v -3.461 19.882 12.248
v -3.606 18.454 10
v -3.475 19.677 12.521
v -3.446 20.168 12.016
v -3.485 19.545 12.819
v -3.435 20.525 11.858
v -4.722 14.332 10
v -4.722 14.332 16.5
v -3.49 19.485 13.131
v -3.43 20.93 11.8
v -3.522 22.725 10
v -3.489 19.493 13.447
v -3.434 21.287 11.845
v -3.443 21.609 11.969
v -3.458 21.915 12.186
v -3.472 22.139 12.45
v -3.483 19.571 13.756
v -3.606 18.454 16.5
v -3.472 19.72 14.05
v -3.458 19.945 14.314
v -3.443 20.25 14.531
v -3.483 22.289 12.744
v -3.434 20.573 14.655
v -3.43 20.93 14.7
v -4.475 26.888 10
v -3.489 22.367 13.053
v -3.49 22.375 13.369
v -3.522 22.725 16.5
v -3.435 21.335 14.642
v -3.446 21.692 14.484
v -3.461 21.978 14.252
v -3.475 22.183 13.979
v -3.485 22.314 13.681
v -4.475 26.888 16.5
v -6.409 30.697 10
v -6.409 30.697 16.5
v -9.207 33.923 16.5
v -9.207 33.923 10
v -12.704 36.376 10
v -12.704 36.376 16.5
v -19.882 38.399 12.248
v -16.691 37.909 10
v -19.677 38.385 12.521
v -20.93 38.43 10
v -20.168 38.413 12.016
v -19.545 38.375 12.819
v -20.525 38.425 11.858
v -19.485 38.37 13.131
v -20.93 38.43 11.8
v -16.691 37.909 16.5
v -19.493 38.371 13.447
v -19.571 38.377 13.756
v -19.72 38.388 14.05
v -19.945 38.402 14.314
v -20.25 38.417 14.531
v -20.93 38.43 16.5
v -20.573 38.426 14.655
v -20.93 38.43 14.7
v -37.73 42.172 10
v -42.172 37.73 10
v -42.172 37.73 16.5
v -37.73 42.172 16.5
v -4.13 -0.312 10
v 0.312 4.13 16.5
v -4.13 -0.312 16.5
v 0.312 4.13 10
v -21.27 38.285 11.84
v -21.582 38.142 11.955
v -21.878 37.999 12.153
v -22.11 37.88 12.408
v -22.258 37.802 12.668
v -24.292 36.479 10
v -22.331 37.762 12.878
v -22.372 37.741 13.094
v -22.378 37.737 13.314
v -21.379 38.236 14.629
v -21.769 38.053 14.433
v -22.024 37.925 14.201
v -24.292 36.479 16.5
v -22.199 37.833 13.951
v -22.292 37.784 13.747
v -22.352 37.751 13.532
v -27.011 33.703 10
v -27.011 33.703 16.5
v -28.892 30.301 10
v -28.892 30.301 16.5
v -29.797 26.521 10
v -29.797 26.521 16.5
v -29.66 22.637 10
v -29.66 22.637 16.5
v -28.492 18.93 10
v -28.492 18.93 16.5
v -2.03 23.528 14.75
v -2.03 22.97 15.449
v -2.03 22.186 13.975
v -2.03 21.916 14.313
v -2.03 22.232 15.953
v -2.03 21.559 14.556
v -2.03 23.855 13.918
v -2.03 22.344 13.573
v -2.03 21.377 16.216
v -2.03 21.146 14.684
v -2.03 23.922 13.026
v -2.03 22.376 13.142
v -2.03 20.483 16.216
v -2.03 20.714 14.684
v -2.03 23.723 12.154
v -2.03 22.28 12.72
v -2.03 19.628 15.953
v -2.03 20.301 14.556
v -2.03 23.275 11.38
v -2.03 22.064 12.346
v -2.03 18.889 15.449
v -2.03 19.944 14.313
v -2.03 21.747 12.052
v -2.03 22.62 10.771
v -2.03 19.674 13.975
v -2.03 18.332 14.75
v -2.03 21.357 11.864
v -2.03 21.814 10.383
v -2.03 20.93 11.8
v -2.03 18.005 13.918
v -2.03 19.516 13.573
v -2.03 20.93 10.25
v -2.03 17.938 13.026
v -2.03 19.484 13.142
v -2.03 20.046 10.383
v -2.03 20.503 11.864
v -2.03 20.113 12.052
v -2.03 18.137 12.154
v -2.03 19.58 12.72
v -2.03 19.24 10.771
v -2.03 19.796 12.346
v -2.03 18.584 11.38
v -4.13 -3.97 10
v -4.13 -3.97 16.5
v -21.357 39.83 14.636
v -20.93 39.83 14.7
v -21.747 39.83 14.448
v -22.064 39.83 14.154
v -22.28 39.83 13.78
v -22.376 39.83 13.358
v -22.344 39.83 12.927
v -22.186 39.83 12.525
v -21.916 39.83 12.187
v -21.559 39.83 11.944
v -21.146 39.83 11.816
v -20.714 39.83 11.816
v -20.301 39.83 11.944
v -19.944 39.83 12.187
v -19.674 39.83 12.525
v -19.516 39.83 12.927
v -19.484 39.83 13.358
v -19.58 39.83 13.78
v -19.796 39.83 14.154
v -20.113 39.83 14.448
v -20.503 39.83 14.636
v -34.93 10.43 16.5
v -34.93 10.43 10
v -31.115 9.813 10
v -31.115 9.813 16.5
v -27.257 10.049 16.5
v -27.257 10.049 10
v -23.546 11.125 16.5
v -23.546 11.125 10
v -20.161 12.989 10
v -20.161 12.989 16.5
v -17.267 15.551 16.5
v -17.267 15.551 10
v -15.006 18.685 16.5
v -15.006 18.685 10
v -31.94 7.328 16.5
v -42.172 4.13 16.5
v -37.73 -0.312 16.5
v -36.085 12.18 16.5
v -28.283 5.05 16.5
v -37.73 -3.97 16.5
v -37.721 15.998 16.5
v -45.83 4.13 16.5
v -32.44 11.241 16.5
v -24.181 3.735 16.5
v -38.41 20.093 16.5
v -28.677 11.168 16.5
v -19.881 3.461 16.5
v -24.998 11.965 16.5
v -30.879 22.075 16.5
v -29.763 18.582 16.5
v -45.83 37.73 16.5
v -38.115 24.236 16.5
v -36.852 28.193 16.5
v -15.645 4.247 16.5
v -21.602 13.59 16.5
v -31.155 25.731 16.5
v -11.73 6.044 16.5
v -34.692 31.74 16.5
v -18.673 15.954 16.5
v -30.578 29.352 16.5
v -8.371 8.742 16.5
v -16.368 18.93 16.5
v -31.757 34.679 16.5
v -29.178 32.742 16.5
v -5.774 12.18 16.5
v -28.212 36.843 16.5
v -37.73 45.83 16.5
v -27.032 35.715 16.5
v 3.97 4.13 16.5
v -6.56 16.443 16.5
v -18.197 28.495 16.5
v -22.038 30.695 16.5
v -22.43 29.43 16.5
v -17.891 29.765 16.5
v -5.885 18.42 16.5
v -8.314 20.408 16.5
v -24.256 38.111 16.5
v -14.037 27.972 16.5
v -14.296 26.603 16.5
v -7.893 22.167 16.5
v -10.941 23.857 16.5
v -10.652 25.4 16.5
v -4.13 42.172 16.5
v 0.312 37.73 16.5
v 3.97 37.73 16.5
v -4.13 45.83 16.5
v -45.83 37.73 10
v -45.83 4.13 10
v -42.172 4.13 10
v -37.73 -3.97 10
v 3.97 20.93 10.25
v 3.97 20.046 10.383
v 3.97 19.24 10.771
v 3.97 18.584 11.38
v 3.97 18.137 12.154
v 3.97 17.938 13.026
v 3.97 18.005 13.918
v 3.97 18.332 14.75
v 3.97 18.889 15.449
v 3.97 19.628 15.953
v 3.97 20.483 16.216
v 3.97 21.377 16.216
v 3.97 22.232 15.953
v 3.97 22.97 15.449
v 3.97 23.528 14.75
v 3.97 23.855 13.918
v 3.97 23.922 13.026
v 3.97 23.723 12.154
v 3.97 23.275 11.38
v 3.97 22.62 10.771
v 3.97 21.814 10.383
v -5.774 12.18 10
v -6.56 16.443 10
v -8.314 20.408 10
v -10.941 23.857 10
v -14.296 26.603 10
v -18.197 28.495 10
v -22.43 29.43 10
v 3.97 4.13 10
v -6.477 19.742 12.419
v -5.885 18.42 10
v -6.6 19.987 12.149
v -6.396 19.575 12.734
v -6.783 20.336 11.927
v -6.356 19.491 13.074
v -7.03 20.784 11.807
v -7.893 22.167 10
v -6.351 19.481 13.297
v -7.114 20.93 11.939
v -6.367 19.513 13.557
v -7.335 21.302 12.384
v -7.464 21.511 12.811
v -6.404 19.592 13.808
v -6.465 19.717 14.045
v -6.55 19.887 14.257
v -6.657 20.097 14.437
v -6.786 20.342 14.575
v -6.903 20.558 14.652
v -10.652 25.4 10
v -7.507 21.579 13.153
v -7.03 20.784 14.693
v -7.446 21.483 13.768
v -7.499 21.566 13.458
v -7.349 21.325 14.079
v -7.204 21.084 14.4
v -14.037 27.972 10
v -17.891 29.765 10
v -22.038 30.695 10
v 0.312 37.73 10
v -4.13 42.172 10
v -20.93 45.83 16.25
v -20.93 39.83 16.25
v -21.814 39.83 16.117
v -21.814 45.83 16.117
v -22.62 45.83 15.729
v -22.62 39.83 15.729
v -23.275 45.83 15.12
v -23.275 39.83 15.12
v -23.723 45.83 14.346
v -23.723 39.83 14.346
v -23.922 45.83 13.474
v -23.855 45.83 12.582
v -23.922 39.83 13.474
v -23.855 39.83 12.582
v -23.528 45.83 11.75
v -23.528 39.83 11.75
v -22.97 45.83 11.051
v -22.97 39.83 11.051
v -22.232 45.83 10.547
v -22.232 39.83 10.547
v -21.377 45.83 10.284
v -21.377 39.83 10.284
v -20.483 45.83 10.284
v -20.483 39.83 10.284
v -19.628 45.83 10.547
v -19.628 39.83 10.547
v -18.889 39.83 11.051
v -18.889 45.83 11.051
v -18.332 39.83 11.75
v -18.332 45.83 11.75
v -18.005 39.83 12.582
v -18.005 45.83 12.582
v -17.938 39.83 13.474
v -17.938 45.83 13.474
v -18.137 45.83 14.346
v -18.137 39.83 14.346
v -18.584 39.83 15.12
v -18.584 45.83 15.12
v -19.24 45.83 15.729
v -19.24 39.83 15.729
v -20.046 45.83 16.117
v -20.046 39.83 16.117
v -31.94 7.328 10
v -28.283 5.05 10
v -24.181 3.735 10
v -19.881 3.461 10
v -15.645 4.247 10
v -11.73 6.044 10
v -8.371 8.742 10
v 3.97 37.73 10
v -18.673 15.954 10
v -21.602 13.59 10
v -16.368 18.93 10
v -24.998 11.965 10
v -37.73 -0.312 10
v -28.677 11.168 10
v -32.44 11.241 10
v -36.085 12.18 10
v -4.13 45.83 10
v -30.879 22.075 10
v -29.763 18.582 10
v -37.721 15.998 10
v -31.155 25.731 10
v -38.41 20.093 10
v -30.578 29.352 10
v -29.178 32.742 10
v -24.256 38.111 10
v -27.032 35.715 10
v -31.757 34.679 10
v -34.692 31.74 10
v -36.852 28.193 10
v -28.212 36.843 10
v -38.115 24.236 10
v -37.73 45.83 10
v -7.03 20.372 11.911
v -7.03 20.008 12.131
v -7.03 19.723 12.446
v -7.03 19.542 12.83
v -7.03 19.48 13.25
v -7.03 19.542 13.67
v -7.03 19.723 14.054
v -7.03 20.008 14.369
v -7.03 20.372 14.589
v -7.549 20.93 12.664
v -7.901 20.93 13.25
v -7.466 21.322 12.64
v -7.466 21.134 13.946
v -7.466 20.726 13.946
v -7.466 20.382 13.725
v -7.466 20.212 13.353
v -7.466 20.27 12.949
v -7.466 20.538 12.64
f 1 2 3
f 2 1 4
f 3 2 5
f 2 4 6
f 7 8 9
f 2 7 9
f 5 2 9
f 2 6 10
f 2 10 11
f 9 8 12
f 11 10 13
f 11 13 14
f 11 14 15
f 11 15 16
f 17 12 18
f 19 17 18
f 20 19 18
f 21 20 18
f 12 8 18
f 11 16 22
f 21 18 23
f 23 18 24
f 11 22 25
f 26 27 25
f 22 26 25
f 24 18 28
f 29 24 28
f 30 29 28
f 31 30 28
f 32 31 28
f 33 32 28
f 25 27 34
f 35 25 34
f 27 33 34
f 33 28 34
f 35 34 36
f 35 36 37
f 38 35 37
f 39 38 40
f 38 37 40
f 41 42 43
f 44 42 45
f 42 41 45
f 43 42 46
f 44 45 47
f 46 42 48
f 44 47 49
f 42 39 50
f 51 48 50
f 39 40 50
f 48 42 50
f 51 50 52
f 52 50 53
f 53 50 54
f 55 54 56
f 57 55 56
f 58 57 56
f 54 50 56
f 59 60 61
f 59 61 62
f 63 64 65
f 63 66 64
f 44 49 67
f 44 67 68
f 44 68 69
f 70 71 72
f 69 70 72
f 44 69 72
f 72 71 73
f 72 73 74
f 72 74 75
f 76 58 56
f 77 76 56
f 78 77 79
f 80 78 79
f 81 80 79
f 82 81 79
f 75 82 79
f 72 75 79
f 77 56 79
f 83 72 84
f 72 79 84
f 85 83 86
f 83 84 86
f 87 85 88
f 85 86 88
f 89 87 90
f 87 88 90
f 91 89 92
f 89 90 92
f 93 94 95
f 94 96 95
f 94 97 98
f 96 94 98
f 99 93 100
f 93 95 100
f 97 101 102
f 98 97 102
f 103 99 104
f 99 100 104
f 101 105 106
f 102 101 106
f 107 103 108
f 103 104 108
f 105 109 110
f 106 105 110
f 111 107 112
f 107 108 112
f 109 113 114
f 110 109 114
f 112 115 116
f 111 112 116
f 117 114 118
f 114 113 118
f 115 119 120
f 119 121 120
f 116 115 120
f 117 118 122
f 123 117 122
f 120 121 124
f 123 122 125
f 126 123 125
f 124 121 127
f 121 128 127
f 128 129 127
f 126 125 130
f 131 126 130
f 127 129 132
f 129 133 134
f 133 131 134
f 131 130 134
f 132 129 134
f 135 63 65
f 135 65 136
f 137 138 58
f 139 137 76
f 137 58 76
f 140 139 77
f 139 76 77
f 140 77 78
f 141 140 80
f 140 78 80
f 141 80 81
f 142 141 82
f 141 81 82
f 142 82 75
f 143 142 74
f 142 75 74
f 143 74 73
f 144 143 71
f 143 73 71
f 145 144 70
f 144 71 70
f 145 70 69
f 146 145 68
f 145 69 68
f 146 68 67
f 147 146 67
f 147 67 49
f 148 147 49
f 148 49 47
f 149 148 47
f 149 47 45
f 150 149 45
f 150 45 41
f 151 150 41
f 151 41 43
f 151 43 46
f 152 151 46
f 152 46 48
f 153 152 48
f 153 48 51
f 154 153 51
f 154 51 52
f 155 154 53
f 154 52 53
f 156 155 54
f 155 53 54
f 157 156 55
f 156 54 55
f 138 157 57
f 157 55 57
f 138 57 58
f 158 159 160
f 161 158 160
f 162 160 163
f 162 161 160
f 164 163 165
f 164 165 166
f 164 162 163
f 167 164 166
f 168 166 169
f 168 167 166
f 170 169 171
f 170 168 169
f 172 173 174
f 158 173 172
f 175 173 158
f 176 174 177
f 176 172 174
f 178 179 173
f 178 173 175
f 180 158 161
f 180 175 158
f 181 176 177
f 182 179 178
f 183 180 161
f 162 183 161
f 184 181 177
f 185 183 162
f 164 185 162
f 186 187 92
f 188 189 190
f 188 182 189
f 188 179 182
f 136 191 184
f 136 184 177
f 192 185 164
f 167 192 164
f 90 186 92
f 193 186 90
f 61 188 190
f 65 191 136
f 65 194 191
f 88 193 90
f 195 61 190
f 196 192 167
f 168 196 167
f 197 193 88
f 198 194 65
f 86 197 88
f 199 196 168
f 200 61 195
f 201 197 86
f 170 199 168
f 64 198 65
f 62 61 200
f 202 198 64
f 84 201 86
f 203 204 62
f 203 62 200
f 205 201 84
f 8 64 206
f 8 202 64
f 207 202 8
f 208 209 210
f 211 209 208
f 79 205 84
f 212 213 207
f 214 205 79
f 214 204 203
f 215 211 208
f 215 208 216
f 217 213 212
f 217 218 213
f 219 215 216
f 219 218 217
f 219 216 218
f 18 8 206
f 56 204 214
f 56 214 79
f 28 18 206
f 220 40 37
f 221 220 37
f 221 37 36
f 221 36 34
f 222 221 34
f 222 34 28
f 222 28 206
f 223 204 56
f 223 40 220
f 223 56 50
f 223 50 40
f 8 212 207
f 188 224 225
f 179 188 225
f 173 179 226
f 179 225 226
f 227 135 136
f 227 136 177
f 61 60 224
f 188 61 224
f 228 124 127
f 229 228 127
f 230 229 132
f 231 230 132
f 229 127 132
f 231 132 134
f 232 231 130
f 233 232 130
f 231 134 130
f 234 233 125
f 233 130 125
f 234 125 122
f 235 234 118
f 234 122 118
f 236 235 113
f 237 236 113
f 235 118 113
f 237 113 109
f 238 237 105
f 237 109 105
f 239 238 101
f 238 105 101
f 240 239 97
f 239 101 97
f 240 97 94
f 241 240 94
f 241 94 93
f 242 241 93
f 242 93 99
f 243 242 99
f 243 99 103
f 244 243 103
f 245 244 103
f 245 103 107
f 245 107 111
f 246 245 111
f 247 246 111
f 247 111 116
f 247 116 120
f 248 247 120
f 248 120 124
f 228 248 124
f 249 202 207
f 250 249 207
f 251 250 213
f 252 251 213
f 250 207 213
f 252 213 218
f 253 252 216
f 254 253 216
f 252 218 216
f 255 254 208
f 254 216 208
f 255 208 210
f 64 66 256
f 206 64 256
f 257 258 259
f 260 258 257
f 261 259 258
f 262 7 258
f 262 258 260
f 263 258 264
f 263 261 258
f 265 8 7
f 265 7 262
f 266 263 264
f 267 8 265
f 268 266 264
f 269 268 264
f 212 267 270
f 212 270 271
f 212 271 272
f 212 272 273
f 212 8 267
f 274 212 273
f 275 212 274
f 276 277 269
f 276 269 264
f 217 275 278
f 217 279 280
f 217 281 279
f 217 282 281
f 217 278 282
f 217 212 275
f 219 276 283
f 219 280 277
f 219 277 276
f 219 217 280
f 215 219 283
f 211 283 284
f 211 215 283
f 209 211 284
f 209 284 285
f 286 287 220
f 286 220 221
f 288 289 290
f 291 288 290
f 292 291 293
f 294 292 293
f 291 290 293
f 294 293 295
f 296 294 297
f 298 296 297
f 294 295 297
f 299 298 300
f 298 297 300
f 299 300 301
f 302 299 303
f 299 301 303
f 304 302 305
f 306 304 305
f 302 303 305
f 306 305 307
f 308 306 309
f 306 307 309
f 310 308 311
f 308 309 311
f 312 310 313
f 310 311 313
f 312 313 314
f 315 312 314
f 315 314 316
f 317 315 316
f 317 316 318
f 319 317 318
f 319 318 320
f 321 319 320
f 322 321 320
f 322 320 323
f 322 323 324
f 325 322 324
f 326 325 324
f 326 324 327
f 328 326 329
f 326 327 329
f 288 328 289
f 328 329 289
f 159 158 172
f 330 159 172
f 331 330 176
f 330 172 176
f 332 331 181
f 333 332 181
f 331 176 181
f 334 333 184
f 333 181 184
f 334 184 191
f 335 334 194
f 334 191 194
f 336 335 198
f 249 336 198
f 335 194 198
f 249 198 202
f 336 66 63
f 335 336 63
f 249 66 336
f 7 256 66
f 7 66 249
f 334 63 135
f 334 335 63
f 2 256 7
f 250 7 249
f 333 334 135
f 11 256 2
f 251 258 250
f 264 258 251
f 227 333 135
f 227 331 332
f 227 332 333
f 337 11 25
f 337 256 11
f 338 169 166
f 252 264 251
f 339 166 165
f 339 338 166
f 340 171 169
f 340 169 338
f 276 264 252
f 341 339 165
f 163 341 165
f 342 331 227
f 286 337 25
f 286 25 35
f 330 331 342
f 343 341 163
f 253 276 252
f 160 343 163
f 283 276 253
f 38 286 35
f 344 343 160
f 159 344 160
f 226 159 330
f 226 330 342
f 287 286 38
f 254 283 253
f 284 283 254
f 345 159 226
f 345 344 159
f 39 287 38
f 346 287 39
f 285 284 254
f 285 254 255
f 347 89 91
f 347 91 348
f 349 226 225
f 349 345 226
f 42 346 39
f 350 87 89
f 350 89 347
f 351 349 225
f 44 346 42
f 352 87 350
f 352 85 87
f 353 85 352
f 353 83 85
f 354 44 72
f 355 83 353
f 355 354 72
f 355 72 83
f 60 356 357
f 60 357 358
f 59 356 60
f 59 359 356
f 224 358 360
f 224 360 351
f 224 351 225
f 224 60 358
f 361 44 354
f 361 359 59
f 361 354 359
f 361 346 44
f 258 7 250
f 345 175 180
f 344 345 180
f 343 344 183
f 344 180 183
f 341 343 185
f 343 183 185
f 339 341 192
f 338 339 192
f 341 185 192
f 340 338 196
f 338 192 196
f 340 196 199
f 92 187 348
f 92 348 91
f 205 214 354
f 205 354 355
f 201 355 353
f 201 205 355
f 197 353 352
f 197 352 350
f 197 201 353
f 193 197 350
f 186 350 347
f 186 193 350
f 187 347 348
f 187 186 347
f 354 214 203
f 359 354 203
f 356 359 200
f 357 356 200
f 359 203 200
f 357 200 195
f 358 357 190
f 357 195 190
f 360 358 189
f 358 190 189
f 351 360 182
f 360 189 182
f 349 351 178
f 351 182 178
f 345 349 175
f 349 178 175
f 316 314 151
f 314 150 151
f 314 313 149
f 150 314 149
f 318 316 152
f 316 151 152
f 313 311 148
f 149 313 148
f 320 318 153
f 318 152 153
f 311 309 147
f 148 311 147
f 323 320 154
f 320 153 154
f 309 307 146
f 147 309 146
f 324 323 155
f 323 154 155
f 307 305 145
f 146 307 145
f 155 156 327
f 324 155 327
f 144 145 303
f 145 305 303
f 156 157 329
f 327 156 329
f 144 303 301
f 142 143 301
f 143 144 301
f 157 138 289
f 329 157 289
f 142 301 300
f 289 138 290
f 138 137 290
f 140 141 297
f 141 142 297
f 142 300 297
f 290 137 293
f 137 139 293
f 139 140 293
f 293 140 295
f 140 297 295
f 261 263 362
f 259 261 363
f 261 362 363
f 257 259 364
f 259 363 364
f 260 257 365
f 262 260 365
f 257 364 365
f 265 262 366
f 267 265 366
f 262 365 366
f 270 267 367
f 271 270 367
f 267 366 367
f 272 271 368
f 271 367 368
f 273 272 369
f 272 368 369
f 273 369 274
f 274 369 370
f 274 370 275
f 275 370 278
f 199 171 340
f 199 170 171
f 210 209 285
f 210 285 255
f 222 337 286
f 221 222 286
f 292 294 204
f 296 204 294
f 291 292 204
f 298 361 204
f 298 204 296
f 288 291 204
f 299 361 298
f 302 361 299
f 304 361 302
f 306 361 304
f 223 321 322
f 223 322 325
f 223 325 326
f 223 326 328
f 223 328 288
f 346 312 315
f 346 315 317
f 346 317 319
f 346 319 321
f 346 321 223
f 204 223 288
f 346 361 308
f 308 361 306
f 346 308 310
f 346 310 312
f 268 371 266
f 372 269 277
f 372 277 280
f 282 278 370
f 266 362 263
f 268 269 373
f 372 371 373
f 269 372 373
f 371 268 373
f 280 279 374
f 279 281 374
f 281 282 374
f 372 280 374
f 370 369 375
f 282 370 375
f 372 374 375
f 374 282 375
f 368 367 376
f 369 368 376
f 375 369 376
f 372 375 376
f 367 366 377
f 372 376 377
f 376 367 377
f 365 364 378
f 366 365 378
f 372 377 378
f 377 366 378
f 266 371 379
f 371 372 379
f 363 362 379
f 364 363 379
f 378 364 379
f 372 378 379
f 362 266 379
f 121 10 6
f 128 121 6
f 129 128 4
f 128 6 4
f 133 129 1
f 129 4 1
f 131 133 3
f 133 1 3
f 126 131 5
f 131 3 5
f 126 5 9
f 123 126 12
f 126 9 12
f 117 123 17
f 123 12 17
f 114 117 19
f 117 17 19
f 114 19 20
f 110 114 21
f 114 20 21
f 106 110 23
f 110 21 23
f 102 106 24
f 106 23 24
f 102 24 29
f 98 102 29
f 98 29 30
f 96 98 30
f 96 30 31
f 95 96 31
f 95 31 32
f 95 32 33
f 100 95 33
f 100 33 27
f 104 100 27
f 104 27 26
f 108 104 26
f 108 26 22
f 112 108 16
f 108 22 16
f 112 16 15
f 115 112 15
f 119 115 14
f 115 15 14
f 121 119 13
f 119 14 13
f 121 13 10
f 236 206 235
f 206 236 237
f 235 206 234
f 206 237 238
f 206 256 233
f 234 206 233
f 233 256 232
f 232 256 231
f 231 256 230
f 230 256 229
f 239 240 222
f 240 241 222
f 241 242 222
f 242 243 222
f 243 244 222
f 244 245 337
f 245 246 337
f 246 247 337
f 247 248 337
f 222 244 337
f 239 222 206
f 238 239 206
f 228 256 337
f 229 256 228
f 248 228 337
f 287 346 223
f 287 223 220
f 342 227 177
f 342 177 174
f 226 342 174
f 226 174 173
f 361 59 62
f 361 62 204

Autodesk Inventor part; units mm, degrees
ref_plane "YZ Plane" through (0, 0, 0) normal (1, 0, 0) x (0, 1, 0)
ref_plane "Work Plane1" through (0, 0, 10) normal (0, 0, 1) x (1, 0, 0)
sketch "Sketch1" plane through (0, 0, 10) normal (0, 0, 1) x (1, 0, 0)
  line L0 (-4.0299, -0.3538) -> (-2.2322, 1.4439) construction
  arc A0 (-1.4439, 2.2322) -> (-2.2322, 1.4439) centre (-0.9299, 0.9299) ccw construction
  line L1 (-1.4439, 2.2322) -> (0.3538, 4.0299) construction
  line L2 (-37.8299, 42.2137) -> (-37.8299, 45.8299) construction
  line L3 (-37.8299, 45.8299) -> (-4.0299, 45.8299) construction
  line L4 (-4.0299, 45.8299) -> (-4.0299, 42.2137) construction
  line L5 (-4.0299, 4.0299) -> (0.3538, 4.0299) projected
  line L6 (-20.9299, 58.9723) -> (17.1124, 20.9299) construction
  line L7 (17.1124, 20.9299) -> (-20.9299, -17.1124) construction
  line L8 (-20.9299, -17.1124) -> (-58.9723, 20.9299) construction
  line L9 (-58.9723, 20.9299) -> (-20.9299, 58.9723) construction
  line L10 (-20.9299, 58.9723) -> (-20.9299, -17.1124) construction
  line L11 (17.1124, 20.9299) -> (-58.9723, 20.9299) construction
  line L12 (-20.9299, 58.9723) -> (32.8701, 58.9723) construction
  line L13 (-43.4299, 43.4299) -> (1.5701, 43.4299) construction
  line L14 (1.5701, 43.4299) -> (1.5701, -1.5701) construction
  line L15 (1.5701, -1.5701) -> (-43.4299, -1.5701) construction
  line L16 (-43.4299, -1.5701) -> (-43.4299, 43.4299) construction
  line L17 (-43.4299, 43.4299) -> (1.5701, -1.5701) construction
  line L18 (1.5701, 43.4299) -> (-43.4299, -1.5701) construction
  line L19 (-43.4299, 5.3876) -> (-43.4299, 36.4723)
  line L20 (-43.4299, 36.4723) -> (-36.4723, 43.4299)
  line L21 (-36.4723, 43.4299) -> (-5.3876, 43.4299)
  line L22 (-5.3876, 43.4299) -> (1.5701, 36.4723)
  line L23 (1.5701, 36.4723) -> (1.5701, 5.3876)
  line L24 (1.5701, 5.3876) -> (-5.3876, -1.5701)
  line L25 (-5.3876, -1.5701) -> (-36.4723, -1.5701)
  line L26 (-36.4723, -1.5701) -> (-43.4299, 5.3876)
  line L27 (-4.0299, 42.2137) -> (-37.8299, 42.2137) projected
  line L28 (-4.0299, -0.3538) -> (-4.0299, 4.0299) projected
  circle A1 centre (-20.9299, 20.9299) radius 13.3985
  circle A2 centre (-20.9299, 20.9299) radius 15.4895
  point P0 (-37.8299, 4.0299)
  dimension "d18" = 53.8
  dimension "d19" = 45
  dimension "d20" = 53.8
  dimension "d21" = 45
  dimension "d22" = 45
  dimension "d30" = 26.797
  dimension "d36" = 30.979
extrude "Extrusion1" add sketch "Sketch1" along normal blind 6.5 contours L28 L24 L25 L26 L19 L20 L27 L22 L23 L5 | L5 L24 L28 | L27 L20 L21 L22 | A1 | A2
ref_plane "Work Plane2" through (-40.9959, 0.8639, 22.2359) normal (0, 0, 1) x (1, 0, 0)
sketch "Sketch3" plane through (0, 0, 10) normal (0, 0, -1) x (-1, 0, 0)
  line L0 (37.8299, -0.4701) -> (37.8299, 4.0299) construction
  line L1 (4.0299, 4.0299) -> (4.0299, -0.4701) construction
  line L2 (37.8299, -0.4701) -> (37.8299, 1.1886) construction
  line L3 (4.0299, -3.9701) -> (4.0299, -0.3538) construction
  line L4 (45.8299, 4.0299) -> (42.2137, 4.0299) construction
  line L5 (-0.3538, 4.0299) -> (-3.9701, 4.0299) construction
  line L6 (-3.9701, 37.8299) -> (-0.3538, 37.8299) construction
  line L7 (4.0299, 42.2137) -> (4.0299, 45.8299) construction
  line L8 (37.8299, 45.8299) -> (37.8299, 42.2137) construction
  line L9 (42.2137, 37.8299) -> (45.8299, 37.8299) construction
  line L10 (37.8299, 37.7299) -> (45.8299, 37.7299)
  line L11 (45.8299, 37.7299) -> (45.8299, 4.1299)
  line L12 (45.8299, 4.1299) -> (37.8299, 4.1299)
  line L13 (37.8299, 4.1299) -> (37.8299, 37.7299)
  line L14 (37.7299, 4.0299) -> (4.1299, 4.0299)
  line L15 (4.1299, 4.0299) -> (4.1299, -3.9701)
  line L16 (4.1299, -3.9701) -> (37.7299, -3.9701)
  line L17 (37.7299, -3.9701) -> (37.7299, 4.0299)
  line L18 (4.0299, 4.1299) -> (-3.9701, 4.1299)
  line L19 (-3.9701, 4.1299) -> (-3.9701, 37.7299)
  line L20 (-3.9701, 37.7299) -> (4.0299, 37.7299)
  line L21 (4.0299, 37.7299) -> (4.0299, 4.1299)
  line L22 (4.1299, 37.8299) -> (37.7299, 37.8299)
  line L23 (37.7299, 37.8299) -> (37.7299, 45.8299)
  line L24 (37.7299, 45.8299) -> (4.1299, 45.8299)
  line L25 (4.1299, 45.8299) -> (4.1299, 37.8299)
  point P0 (0, 0)
  dimension "d23" = 0.1
  dimension "d24" = 0.1
  dimension "d25" = 0.1
  dimension "d26" = 0.1
  dimension "d27" = 0.1
extrude "Extrusion3" add sketch "Sketch3" against normal up to surface (6.5 mm away)
sketch "Sketch6" plane through (0, 0, 16.5) normal (0, 0, 1) x (1, 0, 0)
  circle A0 centre (-20.9299, 20.9299) radius 17.5
  circle A1 centre (-20.9299, 20.9299) radius 13.3985
  line L0 (-45.8299, 4.1299) -> (-45.8299, 37.7299) projected
  line L1 (-4.1299, -3.9701) -> (-37.7299, -3.9701) projected
  line L2 (-37.7299, 45.8299) -> (-4.1299, 45.8299) projected
  point P0 (0, 0)
  point P1 (-45.8299, 20.9299)
  point P2 (-20.9299, -3.9701)
  point P3 (-20.9299, 45.8299)
  dimension "d37" = 26.797
  dimension "d38" = 35
extrude "Extrusion5" cut sketch "Sketch6" against normal blind 12 contours A0 | A1
sketch "Sketch7" plane through (0, 0, 16.5) normal (0, 0, 1) x (1, 0, 0)
  circle A0 centre (-20.9299, 20.9299) radius 17.5 construction
  line L0 (3.9701, 4.1299) -> (0.3124, 4.1299) construction
  line L1 (3.9701, 37.7299) -> (3.9701, 4.1299) construction
  line L2 (0.3124, 37.7299) -> (3.9701, 37.7299) construction
  line L3 (0.3124, 37.7299) -> (-4.1299, 42.1723) construction
  line L4 (-4.1299, 45.8299) -> (-4.1299, 42.1723) construction
  line L5 (-37.7299, 45.8299) -> (-4.1299, 45.8299) construction
  line L6 (-37.7299, 42.1723) -> (-37.7299, 45.8299) construction
  line L7 (-37.7299, 42.1723) -> (-42.1723, 37.7299) construction
  line L8 (-45.8299, 37.7299) -> (-42.1723, 37.7299) construction
  line L9 (-45.8299, 4.1299) -> (-45.8299, 37.7299) construction
  line L10 (-42.1723, 4.1299) -> (-45.8299, 4.1299) construction
  line L11 (-42.1723, 4.1299) -> (-37.7299, -0.3124) construction
  line L12 (-37.7299, -3.9701) -> (-37.7299, -0.3124) construction
  line L13 (-4.1299, -3.9701) -> (-37.7299, -3.9701) construction
  line L14 (-4.1299, -0.3124) -> (-4.1299, -3.9701) construction
  line L15 (-4.1299, -0.3124) -> (0.3124, 4.1299) construction
  circle A1 centre (-20.9299, 20.9299) radius 17.5 construction
  line L16 (-5.7745, 12.1799) -> (-36.0854, 12.1799) construction
  line L17 (-36.0854, 12.1799) -> (-20.9299, 38.4299) construction
  line L18 (-20.9299, 38.4299) -> (-5.7745, 12.1799) construction
  circle A2 centre (-22.4299, 22.4299) radius 7 construction
  arc A3 (-20.9299, 38.4299) -> (-24.2565, 38.1108) centre (-20.9299, 20.9299) ccw
  line L19 (-28.4921, 18.9299) -> (-22.4299, 29.4299)
  line L20 (-22.4299, 29.4299) -> (-16.3678, 18.9299)
  line L21 (-16.3678, 18.9299) -> (-28.4921, 18.9299)
  arc A4 (-20.9299, 38.4299) -> (-28.4921, 18.9299) centre (-15.4327, 25.0818) ccw
  arc A5 (-24.2565, 38.1108) -> (-29.7634, 18.5819) centre (-15.4327, 25.0818) ccw
  line L22 (-29.7634, 18.5819) -> (-28.4921, 18.9299)
  arc A6 (-5.7745, 12.1799) -> (-22.4299, 29.4299) centre (-24.2867, 10.9714) ccw
  arc A7 (-5.7745, 12.1799) -> (-4.7215, 14.3316) centre (-20.9299, 20.9299) ccw
  arc A8 (-4.7215, 14.3316) -> (-22.0384, 30.6954) centre (-24.2867, 10.9714) ccw
  line L23 (-22.0384, 30.6954) -> (-22.4299, 29.4299)
  arc A9 (-36.0854, 12.1799) -> (-16.3678, 18.9299) centre (-30.247, 27.2992) ccw
  arc A10 (-36.0854, 12.1799) -> (-34.9298, 10.4297) centre (-20.9299, 20.9299) ccw
  arc A11 (-34.9298, 10.4297) -> (-15.0056, 18.6848) centre (-30.247, 27.2992) ccw
  line L24 (-15.0056, 18.6848) -> (-16.3678, 18.9299)
  dimension "d93" = 14
  dimension "d94" = 1.5
  dimension "d95" = 1.5
  dimension "d96" = 1.3
  dimension "d97" = 1.3
  dimension "d98" = 1.3
extrude "Extrusion6" add sketch "Sketch7" against normal up to surface (6.5 mm away) contours A4 L22 A5 A3 | L23 A8 A7 A6 | L24 A11 A10 A9
sketch "Sketch8" plane through (-37.7299, 45.8299, 10) normal (0, 1, 0) x (1, 0, 0)
  line L0 (0, 0) -> (33.6, 0) projected
  line L1 (0, -6.5) -> (33.6, -6.5) projected
  line L2 (33.6, 0) -> (33.6, -6.5) projected
  line L3 (0, 0) -> (0, -6.5) projected
  point P0 (37.7299, 10)
  point P1 (16.8, -3.25)
  point P2 (16.8, 0)
  point P3 (16.8, -6.5)
  point P4 (33.6, -3.25)
  point P5 (0, -3.25)
hole "Hole1" at (-20.9299, 45.8299, 13.25) direction (0, -1, 0) diameter 2.9 depth 11 tip angle 118 counterbore diameter 6 counterbore depth 6
sketch "Sketch9" plane through (3.9701, 4.1299, 10) normal (1, 0, 0) x (0, 0, -1)
  line L0 (0, 0) -> (0, 33.6) projected
  line L1 (-6.5, 33.6) -> (-6.5, 0) projected
  line L2 (0, 33.6) -> (-6.5, 33.6) projected
  line L3 (0, 0) -> (-6.5, 0) projected
  point P0 (10, -4.1299)
  point P1 (-3.25, 16.8)
  point P2 (0, 16.8)
  point P3 (-6.5, 16.8)
  point P4 (-3.25, 33.6)
  point P5 (-3.25, 0)
hole "Hole2" at (3.9701, 20.9299, 13.25) direction (-1, 0, 0) diameter 2.9 depth 11 tip angle 118 counterbore diameter 6 counterbore depth 6
properties part number "50_Cube_Insert_Thorlabs"
